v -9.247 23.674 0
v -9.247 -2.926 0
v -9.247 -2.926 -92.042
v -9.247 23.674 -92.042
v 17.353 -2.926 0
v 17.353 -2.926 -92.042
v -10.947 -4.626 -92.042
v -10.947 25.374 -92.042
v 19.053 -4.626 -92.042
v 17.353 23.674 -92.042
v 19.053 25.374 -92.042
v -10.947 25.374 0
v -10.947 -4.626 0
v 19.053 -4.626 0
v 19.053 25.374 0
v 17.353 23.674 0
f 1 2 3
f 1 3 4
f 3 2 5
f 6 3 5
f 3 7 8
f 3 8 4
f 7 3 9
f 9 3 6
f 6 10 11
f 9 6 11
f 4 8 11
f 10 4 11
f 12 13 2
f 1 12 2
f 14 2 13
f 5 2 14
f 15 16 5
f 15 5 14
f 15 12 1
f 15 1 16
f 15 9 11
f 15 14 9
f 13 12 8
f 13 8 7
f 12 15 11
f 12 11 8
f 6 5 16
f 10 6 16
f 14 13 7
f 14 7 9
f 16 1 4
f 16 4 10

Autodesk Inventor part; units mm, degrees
ref_plane "YZ Plane" through (0, 0, 0) normal (1, 0, 0) x (0, 1, 0)
ref_plane "XZ Plane" through (0, 0, 0) normal (0, 1, 0) x (-1, 0, 0)
ref_plane "XY Plane" through (0, 0, 0) normal (0, 0, 1) x (1, 0, 0)
sketch "Sketch1" plane through (0, 0, 0) normal (0, 0, 1) x (1, 0, 0)
  line L0 (-10.947, -4.6264) -> (19.053, -4.6264)
  line L1 (19.053, -4.6264) -> (19.053, 25.3736)
  line L2 (19.053, 25.3736) -> (-10.947, 25.3736)
  line L3 (-10.947, 25.3736) -> (-10.947, -4.6264)
  line L4 (-10.947, 23.6736) -> (19.053, 23.6736)
  line L5 (-9.247, -4.6264) -> (-9.247, 25.3736)
  line L6 (17.353, -4.6264) -> (17.353, 25.3736)
  line L7 (-10.947, -2.9264) -> (19.053, -2.9264)
  point P0 (0, 0)
  point P1 (-9.247, -2.9264)
  point P2 (17.353, -2.9264)
  point P3 (17.353, 23.6736)
  point P4 (-9.247, 23.6736)
  dimension "d0" = 30
  dimension "d1" = 30
  dimension "d2" = 1.7
  dimension "d3" = 1.7
  dimension "d4" = 1.7
  dimension "d5" = 1.7
extrude "Extrusion1" add sketch "Sketch1" against normal blind 92.042
extrude "Extrusion2" cut sketch "Sketch1" against normal blind 100000 contours L5 L4 L6 L7
properties part number "Cablecanal Ranurado 30x30 L=116 mm" material "PPS Plastic"
